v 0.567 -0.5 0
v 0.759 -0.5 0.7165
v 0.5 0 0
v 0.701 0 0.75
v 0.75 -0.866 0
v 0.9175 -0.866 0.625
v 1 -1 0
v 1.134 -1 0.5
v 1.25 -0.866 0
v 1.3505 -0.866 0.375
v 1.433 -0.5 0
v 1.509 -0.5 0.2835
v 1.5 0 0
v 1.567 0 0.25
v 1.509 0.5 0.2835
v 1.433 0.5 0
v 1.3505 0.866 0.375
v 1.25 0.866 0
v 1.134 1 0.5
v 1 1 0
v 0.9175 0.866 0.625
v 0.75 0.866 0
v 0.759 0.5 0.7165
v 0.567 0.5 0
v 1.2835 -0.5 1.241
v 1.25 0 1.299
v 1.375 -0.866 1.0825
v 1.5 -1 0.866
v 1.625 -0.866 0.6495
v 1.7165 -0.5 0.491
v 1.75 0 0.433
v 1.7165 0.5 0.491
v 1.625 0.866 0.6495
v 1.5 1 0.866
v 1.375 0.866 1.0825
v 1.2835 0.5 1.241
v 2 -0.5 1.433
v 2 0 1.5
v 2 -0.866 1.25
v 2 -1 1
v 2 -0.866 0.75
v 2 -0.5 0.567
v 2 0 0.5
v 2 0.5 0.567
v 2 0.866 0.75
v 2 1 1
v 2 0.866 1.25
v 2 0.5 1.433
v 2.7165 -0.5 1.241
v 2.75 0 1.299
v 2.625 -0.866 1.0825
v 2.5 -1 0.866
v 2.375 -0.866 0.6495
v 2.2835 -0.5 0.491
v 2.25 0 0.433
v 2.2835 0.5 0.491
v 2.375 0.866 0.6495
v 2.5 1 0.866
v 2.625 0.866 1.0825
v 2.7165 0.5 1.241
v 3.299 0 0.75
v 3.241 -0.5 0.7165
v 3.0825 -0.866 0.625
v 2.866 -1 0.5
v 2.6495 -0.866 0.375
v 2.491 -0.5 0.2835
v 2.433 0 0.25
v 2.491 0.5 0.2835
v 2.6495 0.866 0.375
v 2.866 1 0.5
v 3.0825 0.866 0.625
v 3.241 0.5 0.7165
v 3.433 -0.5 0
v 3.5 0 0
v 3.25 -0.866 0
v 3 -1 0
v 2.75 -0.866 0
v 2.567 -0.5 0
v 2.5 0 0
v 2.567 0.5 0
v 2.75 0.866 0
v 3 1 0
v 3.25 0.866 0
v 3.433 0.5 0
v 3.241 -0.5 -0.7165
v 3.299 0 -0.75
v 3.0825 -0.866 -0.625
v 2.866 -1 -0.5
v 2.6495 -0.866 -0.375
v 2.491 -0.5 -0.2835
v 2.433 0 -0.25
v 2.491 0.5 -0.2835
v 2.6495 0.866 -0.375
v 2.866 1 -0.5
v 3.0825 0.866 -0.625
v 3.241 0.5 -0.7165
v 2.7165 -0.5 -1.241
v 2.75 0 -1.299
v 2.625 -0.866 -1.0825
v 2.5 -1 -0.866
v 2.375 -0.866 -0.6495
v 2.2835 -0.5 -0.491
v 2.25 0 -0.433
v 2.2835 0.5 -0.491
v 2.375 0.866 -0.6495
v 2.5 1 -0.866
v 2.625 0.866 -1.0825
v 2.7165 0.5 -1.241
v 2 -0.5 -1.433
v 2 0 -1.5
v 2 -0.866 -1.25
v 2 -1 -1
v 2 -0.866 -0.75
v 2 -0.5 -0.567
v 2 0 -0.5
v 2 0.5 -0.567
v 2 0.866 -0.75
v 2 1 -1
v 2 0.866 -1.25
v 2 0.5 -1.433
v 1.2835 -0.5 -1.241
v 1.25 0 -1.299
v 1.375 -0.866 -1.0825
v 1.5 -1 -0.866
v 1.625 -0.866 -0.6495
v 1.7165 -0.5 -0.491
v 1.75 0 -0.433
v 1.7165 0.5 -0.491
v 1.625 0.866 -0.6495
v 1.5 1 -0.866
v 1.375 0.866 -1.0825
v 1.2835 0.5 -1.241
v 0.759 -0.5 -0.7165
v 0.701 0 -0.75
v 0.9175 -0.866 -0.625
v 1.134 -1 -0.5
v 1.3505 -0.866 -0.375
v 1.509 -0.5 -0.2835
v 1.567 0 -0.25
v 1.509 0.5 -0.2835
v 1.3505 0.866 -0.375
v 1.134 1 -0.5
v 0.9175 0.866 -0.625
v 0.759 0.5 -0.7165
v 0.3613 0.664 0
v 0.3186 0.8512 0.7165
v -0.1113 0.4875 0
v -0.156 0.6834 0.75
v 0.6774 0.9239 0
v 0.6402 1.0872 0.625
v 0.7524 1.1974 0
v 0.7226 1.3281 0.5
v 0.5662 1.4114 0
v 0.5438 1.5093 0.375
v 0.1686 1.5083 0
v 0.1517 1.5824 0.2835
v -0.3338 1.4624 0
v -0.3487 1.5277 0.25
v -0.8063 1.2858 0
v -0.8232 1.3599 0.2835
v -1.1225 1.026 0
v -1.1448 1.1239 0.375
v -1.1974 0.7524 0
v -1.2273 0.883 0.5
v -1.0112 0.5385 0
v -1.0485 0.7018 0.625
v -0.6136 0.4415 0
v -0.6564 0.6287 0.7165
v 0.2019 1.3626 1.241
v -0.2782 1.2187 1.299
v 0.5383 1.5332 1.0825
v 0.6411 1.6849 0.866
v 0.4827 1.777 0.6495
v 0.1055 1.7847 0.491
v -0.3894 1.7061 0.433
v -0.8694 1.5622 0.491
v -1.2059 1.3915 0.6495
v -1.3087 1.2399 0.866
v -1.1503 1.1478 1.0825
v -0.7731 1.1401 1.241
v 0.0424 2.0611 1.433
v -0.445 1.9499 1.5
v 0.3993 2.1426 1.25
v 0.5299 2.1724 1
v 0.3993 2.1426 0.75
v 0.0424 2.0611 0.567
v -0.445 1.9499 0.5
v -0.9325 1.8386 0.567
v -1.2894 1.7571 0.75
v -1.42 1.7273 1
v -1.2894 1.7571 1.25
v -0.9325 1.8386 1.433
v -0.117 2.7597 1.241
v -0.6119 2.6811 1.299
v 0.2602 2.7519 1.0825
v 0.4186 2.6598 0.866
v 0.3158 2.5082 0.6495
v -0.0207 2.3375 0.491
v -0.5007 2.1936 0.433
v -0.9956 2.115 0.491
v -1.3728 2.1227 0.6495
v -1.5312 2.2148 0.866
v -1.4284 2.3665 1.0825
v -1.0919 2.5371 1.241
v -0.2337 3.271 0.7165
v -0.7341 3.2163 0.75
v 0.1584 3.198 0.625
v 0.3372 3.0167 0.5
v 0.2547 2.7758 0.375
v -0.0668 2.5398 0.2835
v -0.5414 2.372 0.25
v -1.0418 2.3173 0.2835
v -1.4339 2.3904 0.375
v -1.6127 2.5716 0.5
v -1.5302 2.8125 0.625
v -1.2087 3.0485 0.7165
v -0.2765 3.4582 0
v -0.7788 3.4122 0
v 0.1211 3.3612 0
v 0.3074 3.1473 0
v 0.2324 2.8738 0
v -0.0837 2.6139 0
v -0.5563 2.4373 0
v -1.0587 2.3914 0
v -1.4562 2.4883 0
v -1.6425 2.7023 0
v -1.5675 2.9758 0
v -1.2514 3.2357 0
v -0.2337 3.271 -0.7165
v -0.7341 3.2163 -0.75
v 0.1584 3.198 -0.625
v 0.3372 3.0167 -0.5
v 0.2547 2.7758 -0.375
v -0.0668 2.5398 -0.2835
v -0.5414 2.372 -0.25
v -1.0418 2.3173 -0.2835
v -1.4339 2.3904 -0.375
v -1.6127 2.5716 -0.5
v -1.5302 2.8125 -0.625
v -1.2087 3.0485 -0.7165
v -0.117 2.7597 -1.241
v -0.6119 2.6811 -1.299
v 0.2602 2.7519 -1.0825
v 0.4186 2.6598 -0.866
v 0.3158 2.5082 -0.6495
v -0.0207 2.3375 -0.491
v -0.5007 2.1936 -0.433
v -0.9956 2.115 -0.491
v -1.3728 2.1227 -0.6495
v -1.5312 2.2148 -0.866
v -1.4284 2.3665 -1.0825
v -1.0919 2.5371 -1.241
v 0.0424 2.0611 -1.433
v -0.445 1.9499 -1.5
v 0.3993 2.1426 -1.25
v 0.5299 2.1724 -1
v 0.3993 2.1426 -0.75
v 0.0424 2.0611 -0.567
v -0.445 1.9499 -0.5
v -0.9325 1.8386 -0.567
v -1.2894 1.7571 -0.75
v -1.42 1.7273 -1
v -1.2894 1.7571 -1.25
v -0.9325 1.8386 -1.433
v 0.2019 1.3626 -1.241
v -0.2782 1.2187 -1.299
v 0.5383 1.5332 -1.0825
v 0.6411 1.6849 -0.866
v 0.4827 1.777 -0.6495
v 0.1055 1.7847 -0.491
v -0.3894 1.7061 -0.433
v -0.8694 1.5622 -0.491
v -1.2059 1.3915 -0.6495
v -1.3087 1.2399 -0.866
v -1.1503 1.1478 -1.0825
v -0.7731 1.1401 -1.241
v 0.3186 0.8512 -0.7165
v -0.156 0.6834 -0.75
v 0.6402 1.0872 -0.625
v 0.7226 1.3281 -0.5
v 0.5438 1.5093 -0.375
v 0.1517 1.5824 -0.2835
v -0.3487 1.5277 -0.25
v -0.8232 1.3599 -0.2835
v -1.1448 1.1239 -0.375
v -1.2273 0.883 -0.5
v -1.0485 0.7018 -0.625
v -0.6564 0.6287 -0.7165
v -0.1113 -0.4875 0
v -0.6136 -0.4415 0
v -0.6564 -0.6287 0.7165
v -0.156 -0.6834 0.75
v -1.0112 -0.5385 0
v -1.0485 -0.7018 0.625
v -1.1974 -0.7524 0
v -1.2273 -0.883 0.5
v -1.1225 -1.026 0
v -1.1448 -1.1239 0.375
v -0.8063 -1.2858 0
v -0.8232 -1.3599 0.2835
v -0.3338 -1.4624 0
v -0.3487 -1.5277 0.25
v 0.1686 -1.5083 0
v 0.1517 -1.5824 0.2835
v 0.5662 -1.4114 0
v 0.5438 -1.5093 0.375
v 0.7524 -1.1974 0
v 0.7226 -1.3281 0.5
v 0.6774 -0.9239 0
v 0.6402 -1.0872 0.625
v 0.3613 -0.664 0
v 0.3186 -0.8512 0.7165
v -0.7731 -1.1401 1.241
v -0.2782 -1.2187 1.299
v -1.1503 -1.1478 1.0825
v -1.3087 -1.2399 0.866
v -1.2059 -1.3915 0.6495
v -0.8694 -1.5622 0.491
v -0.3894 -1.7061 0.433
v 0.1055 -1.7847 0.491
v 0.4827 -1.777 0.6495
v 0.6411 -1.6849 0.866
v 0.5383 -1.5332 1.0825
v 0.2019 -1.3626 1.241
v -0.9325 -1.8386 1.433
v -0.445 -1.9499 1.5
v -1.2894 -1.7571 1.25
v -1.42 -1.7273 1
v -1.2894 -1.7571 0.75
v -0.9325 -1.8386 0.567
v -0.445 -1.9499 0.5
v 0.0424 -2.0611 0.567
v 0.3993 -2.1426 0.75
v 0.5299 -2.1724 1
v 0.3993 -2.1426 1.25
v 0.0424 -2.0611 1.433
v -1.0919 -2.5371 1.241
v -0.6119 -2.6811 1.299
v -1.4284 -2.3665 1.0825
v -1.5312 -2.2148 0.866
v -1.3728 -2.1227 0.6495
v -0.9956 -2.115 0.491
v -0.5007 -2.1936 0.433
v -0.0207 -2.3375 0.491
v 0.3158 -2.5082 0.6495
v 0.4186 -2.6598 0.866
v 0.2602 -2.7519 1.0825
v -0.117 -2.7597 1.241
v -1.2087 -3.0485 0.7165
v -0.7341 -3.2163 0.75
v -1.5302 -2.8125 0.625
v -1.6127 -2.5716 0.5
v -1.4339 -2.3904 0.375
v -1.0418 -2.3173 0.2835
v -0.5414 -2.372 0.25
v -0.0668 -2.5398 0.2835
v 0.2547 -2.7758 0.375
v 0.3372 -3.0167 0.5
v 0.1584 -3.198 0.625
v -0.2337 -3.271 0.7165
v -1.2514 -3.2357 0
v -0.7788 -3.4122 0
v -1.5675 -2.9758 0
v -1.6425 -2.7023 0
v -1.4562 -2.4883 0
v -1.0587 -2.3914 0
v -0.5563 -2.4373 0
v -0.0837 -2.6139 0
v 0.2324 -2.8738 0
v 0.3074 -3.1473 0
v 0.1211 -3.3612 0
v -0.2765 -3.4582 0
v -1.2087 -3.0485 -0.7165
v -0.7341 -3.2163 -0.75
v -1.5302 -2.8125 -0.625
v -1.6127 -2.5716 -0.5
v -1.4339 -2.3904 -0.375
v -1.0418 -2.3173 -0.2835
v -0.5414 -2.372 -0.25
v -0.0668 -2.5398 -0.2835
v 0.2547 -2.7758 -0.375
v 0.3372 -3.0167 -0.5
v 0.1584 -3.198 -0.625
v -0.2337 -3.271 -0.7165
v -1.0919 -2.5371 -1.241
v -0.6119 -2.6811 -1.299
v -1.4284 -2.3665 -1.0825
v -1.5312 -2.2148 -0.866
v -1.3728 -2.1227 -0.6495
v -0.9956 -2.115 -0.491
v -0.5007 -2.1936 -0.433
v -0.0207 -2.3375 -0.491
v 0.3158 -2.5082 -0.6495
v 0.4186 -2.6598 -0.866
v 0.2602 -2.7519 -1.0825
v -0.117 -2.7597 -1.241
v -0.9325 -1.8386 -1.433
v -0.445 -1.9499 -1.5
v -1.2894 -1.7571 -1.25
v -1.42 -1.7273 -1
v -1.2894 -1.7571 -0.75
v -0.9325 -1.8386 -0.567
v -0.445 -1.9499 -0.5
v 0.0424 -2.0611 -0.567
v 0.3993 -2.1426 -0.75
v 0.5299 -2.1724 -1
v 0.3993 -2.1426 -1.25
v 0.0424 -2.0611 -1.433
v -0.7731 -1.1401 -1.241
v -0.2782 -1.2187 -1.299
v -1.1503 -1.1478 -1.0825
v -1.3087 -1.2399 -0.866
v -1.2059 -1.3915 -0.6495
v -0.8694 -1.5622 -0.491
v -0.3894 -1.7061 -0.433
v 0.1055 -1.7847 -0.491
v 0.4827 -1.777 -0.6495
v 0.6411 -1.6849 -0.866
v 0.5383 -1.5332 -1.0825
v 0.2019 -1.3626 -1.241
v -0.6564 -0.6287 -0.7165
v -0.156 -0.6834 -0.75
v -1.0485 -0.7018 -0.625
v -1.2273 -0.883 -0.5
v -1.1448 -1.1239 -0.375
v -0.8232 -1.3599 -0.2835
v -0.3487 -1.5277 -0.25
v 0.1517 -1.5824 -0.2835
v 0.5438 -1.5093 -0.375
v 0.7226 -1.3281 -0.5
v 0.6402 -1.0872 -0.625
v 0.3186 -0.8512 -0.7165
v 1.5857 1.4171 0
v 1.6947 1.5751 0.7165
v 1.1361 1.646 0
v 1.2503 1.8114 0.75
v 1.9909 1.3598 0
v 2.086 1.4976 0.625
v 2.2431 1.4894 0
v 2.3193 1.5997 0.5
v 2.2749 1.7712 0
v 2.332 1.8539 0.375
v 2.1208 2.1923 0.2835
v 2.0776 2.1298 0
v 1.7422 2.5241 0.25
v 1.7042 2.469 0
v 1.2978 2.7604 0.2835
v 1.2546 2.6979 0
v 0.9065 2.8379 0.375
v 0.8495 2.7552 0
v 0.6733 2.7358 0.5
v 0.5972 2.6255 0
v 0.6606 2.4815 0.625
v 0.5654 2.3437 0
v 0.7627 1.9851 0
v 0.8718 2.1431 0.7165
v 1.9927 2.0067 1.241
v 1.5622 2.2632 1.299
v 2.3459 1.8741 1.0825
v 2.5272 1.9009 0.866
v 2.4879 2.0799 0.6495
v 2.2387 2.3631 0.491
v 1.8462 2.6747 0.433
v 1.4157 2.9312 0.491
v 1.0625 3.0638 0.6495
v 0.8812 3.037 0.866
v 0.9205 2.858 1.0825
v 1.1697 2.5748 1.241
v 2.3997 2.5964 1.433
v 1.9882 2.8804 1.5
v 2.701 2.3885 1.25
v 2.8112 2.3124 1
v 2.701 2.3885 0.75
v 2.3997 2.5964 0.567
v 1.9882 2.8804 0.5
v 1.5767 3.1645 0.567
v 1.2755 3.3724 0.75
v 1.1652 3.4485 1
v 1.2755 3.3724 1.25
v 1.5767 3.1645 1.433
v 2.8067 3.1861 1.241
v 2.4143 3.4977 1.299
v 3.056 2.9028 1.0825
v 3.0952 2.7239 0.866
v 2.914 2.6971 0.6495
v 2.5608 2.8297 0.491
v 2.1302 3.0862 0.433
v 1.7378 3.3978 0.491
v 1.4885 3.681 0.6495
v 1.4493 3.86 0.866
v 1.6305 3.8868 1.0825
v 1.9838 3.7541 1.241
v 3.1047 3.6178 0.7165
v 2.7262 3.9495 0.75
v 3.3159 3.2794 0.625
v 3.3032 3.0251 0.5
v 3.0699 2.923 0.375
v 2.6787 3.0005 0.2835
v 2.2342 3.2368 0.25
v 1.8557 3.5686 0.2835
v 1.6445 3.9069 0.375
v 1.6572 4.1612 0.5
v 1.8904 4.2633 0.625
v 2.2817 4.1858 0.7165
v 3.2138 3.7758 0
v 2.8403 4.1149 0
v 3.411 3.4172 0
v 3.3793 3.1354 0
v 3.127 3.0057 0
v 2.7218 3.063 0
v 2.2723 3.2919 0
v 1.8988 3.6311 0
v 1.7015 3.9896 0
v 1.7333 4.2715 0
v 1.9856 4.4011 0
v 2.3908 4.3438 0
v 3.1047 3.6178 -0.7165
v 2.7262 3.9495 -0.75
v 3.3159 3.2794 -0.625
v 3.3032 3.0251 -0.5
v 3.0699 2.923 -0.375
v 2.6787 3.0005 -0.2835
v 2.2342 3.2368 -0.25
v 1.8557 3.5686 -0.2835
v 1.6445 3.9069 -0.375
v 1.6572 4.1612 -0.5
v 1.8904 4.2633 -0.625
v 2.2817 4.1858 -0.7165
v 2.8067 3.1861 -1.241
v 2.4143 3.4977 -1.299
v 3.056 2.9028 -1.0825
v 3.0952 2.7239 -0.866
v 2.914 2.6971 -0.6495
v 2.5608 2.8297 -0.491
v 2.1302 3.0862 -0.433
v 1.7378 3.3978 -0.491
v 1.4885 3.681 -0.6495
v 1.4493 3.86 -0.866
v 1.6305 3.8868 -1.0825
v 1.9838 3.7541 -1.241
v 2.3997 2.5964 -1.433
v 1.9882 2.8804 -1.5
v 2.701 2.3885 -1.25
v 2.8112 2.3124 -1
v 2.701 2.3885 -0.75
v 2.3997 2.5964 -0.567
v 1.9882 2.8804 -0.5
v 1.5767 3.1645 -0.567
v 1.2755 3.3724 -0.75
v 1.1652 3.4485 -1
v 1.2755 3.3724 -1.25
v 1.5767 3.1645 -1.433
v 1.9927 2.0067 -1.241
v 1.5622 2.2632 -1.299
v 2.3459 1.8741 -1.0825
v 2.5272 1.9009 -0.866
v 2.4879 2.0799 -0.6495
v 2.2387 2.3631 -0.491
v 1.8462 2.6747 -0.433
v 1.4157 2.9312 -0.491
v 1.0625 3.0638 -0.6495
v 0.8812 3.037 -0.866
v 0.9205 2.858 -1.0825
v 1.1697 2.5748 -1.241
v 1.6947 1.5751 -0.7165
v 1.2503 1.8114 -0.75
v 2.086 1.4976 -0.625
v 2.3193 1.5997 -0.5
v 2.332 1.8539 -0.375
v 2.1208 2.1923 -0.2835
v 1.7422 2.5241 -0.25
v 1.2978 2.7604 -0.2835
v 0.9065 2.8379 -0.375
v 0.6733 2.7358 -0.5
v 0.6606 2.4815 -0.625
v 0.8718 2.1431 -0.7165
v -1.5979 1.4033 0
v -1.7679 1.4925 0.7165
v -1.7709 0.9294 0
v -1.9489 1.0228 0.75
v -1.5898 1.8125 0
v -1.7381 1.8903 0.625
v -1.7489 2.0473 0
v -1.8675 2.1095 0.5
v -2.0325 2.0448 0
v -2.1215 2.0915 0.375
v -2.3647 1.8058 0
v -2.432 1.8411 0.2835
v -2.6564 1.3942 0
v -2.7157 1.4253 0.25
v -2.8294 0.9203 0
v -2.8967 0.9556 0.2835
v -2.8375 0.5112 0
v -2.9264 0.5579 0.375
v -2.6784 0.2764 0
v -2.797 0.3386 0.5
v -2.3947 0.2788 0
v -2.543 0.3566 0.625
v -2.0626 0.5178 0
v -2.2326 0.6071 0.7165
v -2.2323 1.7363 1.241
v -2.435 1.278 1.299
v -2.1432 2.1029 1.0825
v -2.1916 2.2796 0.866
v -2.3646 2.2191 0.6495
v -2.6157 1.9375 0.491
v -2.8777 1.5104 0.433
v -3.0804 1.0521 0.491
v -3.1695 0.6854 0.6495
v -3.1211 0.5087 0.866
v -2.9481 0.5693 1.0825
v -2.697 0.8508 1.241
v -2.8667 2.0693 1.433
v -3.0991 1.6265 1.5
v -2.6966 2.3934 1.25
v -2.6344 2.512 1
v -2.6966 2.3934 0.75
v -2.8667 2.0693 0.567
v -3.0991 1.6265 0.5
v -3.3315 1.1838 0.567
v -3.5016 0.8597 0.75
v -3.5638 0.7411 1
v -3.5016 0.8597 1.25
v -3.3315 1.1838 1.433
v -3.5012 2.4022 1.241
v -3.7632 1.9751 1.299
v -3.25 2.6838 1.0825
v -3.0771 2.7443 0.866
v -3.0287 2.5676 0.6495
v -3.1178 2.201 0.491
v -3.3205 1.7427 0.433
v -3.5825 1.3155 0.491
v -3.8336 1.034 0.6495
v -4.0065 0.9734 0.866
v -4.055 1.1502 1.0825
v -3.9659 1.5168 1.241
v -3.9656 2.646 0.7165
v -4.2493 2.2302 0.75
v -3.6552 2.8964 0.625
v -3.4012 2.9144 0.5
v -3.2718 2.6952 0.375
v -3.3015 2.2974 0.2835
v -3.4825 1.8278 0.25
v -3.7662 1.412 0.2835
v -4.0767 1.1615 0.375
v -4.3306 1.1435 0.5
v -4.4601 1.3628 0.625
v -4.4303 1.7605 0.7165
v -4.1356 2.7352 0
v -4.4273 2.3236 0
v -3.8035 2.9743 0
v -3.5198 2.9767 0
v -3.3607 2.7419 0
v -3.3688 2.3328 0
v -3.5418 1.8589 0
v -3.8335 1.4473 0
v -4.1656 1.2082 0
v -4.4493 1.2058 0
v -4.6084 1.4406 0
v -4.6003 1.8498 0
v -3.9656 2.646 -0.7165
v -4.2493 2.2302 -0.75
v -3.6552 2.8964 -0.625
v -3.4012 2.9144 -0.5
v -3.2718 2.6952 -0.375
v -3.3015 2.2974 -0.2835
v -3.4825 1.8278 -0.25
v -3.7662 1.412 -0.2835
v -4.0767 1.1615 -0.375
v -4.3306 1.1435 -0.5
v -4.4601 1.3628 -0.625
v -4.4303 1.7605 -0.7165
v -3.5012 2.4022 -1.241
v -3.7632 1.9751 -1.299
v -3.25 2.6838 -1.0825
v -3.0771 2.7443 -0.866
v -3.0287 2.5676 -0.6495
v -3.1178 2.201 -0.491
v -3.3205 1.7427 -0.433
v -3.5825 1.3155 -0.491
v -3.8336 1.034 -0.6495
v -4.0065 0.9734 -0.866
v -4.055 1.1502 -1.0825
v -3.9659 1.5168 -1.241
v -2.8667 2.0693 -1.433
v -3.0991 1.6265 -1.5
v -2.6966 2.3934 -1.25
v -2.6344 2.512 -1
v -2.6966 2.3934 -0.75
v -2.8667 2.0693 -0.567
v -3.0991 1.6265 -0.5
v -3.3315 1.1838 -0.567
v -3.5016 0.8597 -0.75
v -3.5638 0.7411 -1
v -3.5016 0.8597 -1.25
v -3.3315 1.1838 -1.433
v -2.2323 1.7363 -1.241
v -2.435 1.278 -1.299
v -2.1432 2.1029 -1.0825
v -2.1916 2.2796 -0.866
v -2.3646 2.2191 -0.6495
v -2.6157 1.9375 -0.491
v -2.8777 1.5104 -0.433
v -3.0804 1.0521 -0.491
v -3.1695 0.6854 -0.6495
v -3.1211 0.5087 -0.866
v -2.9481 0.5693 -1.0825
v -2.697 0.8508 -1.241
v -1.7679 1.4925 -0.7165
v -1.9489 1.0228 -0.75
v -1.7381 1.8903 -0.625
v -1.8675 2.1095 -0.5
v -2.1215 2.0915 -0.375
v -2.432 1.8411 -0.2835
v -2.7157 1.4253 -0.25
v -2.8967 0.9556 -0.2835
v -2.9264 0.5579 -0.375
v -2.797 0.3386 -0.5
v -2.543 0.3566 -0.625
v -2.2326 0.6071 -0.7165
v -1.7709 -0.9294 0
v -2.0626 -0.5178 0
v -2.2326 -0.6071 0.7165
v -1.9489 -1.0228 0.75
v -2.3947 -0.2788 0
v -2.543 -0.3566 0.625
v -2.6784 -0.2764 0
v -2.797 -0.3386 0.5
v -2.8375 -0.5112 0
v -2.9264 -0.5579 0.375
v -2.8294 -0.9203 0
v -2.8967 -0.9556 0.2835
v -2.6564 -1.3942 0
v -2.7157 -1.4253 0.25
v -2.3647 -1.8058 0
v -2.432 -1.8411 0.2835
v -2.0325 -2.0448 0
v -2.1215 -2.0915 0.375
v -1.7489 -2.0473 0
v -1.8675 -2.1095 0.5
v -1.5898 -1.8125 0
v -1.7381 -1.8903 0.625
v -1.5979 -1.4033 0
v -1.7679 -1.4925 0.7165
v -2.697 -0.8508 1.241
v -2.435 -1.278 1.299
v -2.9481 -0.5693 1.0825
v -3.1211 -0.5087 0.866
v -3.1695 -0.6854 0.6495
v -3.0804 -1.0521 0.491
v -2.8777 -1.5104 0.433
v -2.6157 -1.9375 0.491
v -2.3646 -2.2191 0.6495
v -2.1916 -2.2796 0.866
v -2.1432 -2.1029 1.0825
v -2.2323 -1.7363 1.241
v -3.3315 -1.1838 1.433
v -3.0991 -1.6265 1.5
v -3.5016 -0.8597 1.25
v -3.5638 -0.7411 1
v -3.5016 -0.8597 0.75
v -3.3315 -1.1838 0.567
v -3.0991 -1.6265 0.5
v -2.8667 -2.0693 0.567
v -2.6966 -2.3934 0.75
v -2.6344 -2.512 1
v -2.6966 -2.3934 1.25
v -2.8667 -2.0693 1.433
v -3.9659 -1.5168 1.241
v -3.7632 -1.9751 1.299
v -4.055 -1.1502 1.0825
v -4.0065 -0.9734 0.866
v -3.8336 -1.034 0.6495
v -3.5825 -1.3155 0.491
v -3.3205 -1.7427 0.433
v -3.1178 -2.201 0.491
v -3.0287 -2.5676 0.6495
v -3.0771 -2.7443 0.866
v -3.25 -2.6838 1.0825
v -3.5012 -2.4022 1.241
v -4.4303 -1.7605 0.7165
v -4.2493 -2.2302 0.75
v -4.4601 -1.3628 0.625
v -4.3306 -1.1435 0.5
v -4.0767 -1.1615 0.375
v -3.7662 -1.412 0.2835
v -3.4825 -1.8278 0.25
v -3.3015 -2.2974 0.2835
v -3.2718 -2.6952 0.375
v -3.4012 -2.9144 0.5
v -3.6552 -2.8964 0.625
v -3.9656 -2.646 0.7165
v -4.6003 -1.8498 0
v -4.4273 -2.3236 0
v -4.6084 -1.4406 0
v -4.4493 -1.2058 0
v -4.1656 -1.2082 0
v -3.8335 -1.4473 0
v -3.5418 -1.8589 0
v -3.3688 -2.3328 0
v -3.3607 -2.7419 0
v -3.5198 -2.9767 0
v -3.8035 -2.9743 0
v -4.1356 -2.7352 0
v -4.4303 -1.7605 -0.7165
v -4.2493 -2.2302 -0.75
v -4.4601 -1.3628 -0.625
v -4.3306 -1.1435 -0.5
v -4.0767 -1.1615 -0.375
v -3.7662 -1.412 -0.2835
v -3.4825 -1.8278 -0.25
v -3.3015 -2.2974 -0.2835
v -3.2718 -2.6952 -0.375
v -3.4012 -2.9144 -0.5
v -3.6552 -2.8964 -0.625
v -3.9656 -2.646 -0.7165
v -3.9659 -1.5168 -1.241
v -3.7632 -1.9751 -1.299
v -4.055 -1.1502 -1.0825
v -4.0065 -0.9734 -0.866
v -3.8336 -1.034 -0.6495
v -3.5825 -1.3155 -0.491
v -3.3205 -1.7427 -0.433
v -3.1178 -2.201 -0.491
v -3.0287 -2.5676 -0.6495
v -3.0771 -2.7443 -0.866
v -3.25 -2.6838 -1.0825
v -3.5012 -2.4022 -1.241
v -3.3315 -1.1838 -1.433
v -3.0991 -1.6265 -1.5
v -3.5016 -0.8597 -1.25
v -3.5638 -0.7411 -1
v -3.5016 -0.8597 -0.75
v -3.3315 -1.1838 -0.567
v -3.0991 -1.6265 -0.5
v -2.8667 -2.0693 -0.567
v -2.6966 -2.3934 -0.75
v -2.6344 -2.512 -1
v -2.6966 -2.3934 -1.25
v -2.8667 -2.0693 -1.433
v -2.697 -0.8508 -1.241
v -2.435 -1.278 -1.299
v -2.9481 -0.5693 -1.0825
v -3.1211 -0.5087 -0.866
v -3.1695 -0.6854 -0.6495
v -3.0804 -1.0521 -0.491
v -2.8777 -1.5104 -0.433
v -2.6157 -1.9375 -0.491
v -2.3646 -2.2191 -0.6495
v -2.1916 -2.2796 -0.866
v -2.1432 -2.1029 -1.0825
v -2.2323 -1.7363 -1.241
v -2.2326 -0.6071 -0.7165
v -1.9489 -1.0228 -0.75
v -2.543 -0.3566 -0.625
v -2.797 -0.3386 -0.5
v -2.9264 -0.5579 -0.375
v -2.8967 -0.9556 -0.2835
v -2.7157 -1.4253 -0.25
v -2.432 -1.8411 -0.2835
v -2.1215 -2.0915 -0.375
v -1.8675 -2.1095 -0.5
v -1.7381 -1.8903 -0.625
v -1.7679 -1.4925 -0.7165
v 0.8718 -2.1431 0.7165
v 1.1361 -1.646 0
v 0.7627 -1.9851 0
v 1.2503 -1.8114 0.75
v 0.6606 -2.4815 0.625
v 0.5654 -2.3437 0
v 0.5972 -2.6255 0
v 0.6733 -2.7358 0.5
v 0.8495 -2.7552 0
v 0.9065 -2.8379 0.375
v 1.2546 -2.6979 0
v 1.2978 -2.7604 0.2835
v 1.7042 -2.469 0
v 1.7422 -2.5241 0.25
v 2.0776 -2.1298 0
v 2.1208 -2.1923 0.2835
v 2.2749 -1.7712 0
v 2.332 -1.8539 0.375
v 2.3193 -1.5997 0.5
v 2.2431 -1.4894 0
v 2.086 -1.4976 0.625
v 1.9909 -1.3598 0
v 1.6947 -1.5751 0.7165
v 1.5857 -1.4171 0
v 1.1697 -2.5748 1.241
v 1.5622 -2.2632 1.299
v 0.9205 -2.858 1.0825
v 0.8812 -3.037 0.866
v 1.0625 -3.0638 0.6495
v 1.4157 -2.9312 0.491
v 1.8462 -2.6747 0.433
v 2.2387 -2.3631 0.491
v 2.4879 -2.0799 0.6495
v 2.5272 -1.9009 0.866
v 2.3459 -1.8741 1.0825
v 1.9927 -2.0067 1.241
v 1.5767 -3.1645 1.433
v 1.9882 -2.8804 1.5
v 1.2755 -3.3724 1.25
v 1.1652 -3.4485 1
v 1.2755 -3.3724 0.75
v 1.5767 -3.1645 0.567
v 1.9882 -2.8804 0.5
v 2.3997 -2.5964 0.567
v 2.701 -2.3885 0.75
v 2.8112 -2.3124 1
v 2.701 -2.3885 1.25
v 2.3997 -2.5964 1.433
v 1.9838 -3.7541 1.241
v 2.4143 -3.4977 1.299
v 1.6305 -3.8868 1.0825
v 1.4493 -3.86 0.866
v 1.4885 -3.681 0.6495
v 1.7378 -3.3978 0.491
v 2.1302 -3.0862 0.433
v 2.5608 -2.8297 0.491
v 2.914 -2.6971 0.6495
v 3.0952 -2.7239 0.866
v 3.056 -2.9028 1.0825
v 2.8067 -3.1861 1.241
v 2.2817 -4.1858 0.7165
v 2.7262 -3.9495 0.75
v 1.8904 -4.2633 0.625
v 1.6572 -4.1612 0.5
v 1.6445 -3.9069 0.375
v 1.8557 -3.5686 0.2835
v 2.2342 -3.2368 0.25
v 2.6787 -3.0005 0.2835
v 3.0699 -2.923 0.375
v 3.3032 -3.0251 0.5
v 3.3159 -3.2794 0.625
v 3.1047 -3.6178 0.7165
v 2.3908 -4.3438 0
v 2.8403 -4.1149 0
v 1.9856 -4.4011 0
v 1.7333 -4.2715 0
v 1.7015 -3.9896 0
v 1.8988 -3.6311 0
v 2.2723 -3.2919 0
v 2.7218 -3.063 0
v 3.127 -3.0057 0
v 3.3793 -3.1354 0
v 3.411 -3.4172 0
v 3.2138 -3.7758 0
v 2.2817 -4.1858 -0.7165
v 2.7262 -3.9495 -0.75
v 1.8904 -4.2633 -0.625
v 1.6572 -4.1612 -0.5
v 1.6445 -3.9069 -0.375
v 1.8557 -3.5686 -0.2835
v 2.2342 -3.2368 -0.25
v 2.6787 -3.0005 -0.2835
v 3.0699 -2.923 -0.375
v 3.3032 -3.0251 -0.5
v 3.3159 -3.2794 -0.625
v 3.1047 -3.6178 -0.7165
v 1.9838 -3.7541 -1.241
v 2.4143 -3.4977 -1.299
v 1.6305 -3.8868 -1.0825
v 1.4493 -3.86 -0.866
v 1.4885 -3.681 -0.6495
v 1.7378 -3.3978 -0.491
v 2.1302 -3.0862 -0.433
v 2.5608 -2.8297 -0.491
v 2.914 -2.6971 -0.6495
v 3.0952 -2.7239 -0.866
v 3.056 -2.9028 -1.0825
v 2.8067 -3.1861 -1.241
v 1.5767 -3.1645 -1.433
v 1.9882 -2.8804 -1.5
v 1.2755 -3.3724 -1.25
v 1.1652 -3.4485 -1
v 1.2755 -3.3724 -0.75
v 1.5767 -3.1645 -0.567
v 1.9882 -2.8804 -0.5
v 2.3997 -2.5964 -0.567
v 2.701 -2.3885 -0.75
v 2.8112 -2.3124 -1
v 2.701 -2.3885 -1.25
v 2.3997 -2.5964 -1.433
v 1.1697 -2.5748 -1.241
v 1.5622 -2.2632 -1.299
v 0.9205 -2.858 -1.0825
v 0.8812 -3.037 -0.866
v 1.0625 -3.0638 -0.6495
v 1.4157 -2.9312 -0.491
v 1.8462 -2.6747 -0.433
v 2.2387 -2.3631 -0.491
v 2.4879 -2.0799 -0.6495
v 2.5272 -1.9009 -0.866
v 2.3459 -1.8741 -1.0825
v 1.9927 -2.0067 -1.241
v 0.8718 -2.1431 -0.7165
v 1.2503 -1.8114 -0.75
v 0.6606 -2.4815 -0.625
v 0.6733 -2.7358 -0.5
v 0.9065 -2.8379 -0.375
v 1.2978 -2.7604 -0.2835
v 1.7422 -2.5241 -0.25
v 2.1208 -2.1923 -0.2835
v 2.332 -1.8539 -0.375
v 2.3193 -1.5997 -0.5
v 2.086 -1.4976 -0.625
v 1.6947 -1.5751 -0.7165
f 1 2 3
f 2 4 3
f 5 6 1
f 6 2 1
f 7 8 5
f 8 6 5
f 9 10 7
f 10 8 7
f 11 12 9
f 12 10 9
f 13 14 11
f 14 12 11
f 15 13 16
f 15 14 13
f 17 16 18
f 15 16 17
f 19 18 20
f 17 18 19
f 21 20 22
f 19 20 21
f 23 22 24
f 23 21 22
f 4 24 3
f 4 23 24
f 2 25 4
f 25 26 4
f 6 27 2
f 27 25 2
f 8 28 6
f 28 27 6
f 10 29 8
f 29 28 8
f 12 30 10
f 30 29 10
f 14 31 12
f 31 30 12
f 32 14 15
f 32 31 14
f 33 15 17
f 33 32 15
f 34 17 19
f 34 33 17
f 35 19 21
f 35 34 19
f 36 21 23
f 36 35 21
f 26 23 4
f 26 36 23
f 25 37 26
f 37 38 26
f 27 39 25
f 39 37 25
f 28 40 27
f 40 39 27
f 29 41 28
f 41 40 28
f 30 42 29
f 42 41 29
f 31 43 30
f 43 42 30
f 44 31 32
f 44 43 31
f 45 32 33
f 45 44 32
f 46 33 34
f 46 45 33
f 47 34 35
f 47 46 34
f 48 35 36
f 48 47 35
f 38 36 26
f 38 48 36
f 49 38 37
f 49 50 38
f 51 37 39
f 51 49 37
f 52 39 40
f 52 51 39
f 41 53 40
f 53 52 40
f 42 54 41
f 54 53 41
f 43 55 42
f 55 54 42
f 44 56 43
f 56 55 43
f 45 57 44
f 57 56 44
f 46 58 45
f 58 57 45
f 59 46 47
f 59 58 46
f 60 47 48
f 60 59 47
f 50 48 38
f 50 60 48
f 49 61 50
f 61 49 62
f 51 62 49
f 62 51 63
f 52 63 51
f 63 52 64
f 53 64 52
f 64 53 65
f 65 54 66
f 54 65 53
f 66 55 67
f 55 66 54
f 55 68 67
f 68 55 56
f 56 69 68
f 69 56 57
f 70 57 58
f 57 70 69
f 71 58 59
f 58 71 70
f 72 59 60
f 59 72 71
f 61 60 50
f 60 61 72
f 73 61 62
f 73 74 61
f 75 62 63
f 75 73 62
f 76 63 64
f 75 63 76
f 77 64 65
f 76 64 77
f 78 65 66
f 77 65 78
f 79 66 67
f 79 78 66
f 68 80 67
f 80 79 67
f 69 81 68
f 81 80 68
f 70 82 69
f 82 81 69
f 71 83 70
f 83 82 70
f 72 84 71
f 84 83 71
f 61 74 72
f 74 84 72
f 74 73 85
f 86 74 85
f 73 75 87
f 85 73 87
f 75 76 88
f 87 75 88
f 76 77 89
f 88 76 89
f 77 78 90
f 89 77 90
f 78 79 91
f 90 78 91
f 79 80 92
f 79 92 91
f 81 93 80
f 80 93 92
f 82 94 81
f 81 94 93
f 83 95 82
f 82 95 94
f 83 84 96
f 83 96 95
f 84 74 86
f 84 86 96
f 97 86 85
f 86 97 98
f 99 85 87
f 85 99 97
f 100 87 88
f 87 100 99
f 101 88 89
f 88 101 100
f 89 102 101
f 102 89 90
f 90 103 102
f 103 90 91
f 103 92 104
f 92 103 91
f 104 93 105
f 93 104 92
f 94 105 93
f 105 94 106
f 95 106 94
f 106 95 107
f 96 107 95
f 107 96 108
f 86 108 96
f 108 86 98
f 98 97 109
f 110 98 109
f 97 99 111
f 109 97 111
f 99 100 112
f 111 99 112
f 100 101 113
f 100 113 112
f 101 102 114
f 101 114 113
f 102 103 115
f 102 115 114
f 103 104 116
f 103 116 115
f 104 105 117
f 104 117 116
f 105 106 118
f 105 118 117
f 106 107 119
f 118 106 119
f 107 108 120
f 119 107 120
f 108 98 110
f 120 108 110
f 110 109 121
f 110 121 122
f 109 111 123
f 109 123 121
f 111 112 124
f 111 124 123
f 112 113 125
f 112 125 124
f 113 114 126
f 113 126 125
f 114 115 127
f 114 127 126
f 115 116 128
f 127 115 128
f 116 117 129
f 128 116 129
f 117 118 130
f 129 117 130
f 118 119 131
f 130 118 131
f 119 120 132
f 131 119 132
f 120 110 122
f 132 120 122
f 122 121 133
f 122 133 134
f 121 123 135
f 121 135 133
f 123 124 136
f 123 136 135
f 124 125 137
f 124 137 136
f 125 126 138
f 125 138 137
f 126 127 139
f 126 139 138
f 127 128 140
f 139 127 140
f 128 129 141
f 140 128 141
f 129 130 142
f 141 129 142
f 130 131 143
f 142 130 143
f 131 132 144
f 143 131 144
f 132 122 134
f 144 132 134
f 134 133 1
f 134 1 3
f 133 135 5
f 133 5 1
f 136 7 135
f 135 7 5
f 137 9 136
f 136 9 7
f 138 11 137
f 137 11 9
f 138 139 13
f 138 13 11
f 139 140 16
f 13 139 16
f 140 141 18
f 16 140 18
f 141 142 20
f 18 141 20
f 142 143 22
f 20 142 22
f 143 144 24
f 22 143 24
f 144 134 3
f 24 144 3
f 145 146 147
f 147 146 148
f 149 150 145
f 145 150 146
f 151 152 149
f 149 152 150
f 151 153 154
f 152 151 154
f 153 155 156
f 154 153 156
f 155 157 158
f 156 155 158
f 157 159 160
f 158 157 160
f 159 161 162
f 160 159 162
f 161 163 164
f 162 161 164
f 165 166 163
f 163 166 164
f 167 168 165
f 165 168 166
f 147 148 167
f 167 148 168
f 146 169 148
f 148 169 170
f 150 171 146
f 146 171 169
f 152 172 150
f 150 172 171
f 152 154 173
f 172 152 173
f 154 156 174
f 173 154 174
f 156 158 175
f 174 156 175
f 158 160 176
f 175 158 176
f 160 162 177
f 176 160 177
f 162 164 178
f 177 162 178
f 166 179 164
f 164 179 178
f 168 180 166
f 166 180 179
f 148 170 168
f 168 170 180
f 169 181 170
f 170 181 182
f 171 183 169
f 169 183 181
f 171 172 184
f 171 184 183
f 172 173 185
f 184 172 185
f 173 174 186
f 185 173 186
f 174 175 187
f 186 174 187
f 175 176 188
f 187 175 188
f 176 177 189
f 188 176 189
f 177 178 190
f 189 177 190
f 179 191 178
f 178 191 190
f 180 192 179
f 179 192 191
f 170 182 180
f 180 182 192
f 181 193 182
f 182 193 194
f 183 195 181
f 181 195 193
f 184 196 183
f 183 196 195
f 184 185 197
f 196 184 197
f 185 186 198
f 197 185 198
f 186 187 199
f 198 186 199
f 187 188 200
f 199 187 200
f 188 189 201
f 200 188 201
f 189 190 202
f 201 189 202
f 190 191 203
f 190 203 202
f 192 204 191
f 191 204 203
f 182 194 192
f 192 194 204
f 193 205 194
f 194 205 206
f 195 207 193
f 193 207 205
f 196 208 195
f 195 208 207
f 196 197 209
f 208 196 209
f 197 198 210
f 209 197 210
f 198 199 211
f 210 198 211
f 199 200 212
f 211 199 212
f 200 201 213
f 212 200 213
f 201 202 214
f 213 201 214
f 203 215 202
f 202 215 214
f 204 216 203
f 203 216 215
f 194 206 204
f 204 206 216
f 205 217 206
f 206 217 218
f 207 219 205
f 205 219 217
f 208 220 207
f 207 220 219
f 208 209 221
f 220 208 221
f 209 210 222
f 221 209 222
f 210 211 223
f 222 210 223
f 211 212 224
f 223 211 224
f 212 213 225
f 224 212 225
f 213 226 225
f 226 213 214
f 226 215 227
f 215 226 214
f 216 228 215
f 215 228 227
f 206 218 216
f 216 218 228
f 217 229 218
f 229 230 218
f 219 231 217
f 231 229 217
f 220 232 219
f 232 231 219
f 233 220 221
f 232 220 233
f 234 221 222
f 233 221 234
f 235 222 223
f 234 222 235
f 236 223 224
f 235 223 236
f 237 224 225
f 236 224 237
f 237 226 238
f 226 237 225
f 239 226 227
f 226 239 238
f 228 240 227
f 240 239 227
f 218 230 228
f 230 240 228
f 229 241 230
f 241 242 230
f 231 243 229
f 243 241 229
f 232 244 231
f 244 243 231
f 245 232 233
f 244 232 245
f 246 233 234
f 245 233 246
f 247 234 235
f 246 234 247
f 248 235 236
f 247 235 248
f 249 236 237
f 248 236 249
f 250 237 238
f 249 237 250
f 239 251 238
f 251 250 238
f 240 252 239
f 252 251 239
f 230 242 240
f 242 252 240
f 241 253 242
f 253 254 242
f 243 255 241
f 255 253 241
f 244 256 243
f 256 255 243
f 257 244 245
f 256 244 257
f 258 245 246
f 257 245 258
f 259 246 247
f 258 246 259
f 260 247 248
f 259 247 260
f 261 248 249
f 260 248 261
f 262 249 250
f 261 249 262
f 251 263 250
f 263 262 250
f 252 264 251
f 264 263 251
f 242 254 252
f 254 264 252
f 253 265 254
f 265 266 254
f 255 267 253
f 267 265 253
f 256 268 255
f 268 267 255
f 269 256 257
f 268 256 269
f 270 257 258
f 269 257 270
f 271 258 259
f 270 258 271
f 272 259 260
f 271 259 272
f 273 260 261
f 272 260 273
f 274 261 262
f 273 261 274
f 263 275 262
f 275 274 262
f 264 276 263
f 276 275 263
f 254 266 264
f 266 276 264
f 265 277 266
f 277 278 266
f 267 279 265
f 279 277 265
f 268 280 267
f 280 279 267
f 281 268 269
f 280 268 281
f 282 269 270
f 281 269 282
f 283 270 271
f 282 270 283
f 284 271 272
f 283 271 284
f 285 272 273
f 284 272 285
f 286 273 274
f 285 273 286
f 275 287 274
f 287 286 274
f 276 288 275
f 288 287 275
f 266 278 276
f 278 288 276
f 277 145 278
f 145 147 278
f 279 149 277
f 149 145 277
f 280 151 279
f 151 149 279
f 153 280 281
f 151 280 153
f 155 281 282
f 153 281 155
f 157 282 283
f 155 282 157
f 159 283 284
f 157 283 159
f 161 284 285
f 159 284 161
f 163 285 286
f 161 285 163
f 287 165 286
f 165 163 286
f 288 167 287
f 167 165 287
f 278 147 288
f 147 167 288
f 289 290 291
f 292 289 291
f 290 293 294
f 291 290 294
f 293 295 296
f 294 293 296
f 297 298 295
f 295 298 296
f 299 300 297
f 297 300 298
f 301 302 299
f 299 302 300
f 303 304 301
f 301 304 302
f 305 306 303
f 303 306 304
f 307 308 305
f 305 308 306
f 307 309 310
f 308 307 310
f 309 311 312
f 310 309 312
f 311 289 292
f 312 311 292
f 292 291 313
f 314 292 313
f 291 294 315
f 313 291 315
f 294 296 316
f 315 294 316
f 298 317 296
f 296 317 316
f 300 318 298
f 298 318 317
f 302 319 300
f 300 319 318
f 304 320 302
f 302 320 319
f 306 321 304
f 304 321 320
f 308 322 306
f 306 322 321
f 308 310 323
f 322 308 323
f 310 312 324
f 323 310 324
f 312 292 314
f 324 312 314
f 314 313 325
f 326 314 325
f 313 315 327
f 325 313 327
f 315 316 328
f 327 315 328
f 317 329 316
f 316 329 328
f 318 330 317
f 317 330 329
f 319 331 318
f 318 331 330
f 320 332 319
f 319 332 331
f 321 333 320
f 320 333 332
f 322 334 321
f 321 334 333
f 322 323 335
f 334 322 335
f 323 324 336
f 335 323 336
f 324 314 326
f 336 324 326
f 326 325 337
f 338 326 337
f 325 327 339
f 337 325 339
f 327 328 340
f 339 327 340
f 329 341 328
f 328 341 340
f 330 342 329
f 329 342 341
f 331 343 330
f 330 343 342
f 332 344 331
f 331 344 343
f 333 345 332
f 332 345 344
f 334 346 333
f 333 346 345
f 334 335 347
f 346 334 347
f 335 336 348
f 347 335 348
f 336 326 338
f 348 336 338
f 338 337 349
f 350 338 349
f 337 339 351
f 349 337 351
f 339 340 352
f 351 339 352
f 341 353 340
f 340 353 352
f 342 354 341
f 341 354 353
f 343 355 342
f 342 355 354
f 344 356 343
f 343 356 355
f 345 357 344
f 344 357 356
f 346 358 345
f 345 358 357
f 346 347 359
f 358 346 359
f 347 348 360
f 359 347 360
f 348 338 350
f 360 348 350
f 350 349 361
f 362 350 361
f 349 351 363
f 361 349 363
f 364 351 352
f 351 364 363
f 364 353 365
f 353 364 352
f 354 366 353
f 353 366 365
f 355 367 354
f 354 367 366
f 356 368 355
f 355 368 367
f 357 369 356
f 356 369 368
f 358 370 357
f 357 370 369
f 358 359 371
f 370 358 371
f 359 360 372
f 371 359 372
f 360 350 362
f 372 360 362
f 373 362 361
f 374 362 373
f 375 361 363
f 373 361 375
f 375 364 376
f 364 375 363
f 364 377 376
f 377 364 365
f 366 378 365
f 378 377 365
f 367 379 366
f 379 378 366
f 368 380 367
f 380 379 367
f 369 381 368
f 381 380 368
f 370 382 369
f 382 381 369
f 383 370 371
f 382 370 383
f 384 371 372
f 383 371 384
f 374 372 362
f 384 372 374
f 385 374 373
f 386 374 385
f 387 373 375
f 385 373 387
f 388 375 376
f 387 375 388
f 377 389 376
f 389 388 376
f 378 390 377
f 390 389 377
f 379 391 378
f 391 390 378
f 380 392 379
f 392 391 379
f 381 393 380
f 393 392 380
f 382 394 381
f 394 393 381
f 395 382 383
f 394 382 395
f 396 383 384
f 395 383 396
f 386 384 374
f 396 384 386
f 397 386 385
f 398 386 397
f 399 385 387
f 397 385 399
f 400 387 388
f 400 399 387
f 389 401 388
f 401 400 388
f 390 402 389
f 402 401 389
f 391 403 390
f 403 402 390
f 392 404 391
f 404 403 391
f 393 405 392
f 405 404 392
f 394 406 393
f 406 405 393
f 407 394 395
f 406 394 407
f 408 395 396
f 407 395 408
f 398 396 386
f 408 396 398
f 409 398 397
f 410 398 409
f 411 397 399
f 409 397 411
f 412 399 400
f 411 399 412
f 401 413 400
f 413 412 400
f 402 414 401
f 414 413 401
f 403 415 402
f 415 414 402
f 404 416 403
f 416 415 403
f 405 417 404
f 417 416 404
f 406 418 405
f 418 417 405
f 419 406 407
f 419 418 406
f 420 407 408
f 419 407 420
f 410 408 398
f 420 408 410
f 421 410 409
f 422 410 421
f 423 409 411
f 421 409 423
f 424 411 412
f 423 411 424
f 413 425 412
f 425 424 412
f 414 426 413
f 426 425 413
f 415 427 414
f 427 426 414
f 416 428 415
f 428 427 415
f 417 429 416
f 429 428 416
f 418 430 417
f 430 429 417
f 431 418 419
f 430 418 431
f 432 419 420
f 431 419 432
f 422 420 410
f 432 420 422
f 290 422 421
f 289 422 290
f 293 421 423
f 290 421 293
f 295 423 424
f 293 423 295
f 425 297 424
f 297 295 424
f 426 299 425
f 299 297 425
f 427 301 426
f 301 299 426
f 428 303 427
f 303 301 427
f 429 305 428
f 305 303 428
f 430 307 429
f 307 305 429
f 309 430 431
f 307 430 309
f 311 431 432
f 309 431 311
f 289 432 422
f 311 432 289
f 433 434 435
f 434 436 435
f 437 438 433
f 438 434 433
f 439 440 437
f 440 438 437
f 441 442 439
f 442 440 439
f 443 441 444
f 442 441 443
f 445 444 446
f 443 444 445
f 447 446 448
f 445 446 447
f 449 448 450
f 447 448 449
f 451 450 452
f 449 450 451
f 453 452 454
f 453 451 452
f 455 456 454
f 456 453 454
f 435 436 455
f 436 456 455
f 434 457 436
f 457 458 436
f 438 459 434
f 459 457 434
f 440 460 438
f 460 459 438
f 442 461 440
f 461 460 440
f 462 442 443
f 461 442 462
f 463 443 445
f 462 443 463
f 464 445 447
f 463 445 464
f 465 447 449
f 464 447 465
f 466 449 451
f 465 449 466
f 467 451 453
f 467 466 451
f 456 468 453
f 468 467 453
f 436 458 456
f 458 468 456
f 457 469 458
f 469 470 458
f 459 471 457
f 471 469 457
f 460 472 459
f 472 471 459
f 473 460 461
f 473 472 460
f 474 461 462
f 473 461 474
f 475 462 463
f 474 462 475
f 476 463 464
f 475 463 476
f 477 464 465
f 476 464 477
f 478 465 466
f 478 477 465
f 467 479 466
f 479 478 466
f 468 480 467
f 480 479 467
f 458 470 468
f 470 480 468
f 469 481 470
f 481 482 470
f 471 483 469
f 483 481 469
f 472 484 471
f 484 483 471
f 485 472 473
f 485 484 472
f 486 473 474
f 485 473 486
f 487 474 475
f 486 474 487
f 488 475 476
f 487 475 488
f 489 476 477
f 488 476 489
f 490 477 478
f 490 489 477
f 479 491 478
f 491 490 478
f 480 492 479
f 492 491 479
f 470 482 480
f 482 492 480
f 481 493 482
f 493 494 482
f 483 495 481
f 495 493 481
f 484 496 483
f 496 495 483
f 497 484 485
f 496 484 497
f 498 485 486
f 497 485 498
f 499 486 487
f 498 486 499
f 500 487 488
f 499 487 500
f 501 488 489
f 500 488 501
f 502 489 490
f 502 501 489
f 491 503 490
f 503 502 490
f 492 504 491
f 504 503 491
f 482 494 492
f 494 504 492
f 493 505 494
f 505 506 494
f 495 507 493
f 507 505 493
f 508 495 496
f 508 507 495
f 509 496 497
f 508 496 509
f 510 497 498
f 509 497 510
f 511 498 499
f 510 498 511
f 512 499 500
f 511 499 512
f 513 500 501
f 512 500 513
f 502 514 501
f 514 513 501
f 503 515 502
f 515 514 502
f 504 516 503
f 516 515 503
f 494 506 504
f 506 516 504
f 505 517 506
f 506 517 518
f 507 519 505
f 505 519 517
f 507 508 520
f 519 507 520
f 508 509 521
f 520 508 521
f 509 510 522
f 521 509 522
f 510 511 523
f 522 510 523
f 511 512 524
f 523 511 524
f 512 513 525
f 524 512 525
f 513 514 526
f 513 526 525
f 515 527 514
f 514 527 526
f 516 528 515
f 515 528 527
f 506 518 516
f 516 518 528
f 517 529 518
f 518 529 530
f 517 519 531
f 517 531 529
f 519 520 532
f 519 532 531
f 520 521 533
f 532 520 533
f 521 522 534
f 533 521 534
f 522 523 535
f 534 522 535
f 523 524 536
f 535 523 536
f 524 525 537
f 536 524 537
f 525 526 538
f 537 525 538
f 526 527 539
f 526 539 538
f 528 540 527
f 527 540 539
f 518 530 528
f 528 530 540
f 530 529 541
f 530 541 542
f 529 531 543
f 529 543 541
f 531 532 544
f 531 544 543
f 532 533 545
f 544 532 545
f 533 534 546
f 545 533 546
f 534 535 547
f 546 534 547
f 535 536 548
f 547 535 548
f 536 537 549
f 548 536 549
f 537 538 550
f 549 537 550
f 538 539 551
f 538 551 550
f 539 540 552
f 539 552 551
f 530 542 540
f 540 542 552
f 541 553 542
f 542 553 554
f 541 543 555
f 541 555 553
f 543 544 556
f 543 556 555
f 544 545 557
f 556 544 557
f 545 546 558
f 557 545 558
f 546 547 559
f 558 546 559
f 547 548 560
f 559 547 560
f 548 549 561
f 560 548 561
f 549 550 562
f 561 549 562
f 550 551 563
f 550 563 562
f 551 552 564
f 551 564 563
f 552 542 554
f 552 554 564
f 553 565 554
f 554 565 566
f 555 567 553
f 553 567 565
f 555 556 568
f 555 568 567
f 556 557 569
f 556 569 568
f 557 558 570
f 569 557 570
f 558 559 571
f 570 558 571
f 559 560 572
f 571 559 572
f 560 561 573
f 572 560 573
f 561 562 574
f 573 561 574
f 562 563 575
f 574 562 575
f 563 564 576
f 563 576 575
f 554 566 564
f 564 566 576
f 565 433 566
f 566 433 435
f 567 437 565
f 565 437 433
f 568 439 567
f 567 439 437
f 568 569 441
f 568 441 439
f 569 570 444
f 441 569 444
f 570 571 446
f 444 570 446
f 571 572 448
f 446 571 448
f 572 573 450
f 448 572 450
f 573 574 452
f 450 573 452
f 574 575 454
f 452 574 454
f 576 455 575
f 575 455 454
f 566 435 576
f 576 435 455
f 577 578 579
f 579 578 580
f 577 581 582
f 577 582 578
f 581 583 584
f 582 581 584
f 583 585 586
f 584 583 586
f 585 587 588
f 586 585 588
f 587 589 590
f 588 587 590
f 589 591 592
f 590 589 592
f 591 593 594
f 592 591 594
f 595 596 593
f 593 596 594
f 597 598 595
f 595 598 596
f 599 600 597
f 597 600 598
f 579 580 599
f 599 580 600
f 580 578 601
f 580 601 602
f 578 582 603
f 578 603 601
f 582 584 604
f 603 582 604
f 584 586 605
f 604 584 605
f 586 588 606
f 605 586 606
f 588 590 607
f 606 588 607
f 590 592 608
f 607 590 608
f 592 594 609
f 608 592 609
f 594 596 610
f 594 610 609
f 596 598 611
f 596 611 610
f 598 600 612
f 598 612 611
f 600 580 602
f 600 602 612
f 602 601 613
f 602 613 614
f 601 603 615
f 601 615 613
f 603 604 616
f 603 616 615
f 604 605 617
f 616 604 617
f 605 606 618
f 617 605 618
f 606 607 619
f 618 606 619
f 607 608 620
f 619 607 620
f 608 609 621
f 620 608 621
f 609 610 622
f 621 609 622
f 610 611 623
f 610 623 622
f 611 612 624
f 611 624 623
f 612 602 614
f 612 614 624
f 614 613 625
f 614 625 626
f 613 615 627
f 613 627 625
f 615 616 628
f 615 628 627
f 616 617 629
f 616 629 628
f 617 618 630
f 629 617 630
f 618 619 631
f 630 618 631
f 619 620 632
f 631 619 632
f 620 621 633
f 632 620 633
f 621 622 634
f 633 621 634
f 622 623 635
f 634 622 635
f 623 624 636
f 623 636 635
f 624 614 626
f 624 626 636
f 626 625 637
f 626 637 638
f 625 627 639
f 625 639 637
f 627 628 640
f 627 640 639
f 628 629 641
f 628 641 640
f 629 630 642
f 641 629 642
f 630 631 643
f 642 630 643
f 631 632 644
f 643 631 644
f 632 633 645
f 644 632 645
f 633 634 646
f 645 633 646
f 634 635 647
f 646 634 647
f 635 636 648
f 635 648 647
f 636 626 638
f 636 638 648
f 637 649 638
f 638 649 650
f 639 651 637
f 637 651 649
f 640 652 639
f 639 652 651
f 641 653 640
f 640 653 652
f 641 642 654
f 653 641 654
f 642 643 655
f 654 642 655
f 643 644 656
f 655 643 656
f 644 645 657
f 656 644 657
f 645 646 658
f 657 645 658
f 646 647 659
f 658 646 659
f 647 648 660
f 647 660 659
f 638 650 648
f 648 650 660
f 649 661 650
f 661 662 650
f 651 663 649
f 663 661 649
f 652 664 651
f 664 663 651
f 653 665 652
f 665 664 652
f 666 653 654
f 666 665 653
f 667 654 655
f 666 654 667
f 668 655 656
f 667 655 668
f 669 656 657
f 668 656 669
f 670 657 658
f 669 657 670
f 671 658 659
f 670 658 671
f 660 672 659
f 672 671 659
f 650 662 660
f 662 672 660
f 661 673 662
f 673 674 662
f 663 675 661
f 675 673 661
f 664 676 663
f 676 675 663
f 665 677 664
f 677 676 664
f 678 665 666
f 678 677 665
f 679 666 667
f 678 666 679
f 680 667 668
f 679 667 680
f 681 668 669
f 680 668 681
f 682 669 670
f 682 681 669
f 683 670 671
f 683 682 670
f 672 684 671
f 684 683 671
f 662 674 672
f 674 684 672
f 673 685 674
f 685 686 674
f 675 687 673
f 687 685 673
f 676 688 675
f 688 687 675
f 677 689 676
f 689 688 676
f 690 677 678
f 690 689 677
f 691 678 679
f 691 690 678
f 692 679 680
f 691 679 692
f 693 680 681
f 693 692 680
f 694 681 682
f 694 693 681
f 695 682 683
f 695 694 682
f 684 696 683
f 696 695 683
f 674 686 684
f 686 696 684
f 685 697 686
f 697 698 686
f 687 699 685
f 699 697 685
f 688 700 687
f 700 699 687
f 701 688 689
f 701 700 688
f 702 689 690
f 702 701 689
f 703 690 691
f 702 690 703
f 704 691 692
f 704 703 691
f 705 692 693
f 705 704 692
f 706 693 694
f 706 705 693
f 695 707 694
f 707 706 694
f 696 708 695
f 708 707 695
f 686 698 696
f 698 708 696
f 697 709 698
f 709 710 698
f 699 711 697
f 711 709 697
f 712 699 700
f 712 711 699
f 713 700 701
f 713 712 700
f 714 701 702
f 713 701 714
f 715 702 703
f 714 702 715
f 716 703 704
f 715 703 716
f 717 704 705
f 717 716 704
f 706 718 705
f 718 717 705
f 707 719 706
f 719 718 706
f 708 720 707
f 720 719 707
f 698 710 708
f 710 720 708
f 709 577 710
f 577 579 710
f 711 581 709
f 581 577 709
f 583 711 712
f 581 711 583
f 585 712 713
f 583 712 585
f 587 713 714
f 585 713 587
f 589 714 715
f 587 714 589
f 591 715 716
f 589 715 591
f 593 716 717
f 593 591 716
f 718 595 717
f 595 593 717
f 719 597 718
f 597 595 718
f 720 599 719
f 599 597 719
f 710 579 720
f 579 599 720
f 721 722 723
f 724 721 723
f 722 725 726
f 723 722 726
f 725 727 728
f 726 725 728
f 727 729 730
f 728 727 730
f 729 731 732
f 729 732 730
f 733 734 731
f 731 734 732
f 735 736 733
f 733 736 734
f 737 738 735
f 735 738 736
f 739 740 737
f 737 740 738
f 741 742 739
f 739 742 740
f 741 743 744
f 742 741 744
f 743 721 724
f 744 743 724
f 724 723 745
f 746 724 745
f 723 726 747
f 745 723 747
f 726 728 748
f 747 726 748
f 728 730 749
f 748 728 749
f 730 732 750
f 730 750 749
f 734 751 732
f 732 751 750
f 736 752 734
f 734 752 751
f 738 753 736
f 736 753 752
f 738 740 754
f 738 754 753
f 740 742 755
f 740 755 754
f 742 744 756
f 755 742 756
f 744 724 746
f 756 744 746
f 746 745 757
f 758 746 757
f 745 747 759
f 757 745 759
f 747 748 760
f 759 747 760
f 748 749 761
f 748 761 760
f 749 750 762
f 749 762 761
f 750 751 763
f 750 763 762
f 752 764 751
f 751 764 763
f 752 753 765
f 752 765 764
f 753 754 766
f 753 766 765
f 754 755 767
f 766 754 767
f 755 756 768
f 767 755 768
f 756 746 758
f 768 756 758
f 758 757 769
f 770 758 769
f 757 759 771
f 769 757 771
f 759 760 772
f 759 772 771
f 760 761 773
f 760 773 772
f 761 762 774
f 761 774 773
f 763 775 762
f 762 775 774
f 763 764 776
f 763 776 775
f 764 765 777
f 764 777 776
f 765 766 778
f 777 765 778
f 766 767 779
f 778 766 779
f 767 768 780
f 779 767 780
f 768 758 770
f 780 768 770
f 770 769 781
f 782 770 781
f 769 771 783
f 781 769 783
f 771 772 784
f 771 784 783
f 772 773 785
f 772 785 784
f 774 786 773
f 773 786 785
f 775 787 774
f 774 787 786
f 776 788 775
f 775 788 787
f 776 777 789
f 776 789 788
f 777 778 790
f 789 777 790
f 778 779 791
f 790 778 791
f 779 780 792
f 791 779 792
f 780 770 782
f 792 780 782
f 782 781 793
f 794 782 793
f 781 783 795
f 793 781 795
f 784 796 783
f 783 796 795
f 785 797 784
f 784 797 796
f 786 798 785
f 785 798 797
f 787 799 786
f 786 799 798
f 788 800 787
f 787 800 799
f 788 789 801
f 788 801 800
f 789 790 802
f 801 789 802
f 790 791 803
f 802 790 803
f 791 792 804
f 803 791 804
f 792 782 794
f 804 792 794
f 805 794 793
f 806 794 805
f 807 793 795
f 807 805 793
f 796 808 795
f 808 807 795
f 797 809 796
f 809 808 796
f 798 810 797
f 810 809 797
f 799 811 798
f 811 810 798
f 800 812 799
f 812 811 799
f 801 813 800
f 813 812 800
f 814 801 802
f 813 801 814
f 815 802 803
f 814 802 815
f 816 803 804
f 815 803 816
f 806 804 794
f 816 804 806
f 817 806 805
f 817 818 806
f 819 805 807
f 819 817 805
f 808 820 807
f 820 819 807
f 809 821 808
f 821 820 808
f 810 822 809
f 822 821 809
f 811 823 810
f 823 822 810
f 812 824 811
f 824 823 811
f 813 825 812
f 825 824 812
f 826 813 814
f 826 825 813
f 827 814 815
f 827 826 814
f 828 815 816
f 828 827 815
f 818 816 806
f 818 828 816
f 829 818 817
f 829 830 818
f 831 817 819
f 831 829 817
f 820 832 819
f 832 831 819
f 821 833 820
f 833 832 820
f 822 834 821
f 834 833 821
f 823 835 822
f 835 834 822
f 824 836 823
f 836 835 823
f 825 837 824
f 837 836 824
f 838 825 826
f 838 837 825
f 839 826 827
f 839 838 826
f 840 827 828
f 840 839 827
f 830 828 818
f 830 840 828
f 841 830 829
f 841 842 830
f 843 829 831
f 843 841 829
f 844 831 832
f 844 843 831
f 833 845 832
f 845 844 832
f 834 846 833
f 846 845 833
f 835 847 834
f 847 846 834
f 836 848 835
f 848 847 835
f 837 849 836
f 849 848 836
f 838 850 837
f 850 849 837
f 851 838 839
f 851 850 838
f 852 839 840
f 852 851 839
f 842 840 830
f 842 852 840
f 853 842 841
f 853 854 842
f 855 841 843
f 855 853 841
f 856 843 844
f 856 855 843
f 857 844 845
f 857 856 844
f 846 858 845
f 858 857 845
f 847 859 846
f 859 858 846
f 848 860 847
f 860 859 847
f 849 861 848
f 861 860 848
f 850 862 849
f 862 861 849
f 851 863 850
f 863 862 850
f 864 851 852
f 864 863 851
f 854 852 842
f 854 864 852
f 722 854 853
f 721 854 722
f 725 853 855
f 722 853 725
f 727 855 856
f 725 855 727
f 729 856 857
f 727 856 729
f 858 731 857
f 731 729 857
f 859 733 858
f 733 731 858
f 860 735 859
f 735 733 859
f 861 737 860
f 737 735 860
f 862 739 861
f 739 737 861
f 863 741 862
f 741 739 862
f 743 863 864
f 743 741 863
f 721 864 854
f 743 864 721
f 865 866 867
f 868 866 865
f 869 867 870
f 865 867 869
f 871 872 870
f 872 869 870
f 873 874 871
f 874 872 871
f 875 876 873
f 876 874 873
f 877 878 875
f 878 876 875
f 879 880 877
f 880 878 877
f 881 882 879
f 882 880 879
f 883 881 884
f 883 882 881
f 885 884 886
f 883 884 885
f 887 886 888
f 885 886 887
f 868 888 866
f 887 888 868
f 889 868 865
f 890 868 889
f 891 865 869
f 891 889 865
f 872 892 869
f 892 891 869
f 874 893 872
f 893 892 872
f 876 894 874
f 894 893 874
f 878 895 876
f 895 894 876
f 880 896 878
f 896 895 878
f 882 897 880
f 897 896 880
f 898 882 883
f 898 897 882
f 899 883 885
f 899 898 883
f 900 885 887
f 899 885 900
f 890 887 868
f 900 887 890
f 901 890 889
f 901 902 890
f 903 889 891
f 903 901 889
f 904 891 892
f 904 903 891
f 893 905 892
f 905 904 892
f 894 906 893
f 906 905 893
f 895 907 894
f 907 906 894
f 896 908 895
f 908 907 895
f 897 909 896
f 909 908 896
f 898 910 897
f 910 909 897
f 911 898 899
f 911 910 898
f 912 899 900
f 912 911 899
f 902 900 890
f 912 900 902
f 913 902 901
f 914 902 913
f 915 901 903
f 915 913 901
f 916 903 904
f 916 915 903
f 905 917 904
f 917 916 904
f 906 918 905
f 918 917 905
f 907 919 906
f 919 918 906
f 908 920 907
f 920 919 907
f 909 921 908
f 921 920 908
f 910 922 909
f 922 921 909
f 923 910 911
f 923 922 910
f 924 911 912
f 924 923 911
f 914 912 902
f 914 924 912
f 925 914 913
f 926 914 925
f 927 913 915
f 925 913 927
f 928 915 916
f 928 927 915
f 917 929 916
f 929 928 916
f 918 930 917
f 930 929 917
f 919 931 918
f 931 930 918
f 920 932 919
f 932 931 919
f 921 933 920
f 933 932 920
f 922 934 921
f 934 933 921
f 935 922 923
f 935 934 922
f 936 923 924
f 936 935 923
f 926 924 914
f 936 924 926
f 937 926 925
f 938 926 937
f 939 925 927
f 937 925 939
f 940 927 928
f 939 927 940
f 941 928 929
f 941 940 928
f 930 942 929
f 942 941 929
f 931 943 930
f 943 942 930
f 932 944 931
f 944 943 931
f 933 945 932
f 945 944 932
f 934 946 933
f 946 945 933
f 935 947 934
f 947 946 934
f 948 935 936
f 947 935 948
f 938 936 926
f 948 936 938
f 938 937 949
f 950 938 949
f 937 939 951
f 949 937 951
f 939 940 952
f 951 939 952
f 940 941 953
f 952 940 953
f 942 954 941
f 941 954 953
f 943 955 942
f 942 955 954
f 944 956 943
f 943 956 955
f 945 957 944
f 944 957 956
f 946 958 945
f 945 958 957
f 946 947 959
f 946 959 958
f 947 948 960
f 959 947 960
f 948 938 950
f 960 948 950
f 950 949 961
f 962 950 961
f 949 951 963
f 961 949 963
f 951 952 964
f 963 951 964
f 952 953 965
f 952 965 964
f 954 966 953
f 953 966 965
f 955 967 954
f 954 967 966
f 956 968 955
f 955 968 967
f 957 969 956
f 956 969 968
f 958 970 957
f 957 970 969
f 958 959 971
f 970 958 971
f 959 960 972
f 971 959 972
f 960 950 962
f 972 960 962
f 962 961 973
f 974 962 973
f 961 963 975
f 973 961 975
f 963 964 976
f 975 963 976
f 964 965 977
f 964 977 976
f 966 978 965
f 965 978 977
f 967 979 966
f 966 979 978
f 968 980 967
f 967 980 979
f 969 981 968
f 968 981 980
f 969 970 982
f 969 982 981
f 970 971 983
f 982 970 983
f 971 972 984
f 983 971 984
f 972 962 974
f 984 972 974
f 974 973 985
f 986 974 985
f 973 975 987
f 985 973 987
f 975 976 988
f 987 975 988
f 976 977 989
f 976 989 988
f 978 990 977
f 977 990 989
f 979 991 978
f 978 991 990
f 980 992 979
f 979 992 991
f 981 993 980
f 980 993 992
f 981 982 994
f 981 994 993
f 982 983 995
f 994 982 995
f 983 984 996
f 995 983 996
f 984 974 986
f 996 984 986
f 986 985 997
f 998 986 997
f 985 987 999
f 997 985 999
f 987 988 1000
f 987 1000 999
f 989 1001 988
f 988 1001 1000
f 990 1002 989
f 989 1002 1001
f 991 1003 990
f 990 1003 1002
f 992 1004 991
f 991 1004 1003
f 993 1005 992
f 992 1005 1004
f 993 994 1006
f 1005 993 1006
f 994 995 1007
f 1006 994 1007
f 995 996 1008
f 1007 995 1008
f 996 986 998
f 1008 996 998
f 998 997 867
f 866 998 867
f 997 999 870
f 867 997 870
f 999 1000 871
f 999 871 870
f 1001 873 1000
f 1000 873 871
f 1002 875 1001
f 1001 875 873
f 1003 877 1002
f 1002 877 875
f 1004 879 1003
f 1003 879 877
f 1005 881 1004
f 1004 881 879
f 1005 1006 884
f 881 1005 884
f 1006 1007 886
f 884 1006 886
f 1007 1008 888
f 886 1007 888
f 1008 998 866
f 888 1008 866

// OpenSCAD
bead_fineness=12;

module seedbead(){
   rotate_extrude(angle=360,$fn=bead_fineness)
    translate([1,0,0])
    scale([0.5,1,1])
    circle(1,$fn=bead_fineness);
 }

for(i=[0,2,5])
    rotate([0,0,360/7*i])
translate([2,0,0])
rotate([90,0,0])
seedbead();


for(i=[2,5.5,7.5,11])
    rotate([0,0,360/13*i])
translate([3.5,0,0])
rotate([90,0,0])
seedbead();
